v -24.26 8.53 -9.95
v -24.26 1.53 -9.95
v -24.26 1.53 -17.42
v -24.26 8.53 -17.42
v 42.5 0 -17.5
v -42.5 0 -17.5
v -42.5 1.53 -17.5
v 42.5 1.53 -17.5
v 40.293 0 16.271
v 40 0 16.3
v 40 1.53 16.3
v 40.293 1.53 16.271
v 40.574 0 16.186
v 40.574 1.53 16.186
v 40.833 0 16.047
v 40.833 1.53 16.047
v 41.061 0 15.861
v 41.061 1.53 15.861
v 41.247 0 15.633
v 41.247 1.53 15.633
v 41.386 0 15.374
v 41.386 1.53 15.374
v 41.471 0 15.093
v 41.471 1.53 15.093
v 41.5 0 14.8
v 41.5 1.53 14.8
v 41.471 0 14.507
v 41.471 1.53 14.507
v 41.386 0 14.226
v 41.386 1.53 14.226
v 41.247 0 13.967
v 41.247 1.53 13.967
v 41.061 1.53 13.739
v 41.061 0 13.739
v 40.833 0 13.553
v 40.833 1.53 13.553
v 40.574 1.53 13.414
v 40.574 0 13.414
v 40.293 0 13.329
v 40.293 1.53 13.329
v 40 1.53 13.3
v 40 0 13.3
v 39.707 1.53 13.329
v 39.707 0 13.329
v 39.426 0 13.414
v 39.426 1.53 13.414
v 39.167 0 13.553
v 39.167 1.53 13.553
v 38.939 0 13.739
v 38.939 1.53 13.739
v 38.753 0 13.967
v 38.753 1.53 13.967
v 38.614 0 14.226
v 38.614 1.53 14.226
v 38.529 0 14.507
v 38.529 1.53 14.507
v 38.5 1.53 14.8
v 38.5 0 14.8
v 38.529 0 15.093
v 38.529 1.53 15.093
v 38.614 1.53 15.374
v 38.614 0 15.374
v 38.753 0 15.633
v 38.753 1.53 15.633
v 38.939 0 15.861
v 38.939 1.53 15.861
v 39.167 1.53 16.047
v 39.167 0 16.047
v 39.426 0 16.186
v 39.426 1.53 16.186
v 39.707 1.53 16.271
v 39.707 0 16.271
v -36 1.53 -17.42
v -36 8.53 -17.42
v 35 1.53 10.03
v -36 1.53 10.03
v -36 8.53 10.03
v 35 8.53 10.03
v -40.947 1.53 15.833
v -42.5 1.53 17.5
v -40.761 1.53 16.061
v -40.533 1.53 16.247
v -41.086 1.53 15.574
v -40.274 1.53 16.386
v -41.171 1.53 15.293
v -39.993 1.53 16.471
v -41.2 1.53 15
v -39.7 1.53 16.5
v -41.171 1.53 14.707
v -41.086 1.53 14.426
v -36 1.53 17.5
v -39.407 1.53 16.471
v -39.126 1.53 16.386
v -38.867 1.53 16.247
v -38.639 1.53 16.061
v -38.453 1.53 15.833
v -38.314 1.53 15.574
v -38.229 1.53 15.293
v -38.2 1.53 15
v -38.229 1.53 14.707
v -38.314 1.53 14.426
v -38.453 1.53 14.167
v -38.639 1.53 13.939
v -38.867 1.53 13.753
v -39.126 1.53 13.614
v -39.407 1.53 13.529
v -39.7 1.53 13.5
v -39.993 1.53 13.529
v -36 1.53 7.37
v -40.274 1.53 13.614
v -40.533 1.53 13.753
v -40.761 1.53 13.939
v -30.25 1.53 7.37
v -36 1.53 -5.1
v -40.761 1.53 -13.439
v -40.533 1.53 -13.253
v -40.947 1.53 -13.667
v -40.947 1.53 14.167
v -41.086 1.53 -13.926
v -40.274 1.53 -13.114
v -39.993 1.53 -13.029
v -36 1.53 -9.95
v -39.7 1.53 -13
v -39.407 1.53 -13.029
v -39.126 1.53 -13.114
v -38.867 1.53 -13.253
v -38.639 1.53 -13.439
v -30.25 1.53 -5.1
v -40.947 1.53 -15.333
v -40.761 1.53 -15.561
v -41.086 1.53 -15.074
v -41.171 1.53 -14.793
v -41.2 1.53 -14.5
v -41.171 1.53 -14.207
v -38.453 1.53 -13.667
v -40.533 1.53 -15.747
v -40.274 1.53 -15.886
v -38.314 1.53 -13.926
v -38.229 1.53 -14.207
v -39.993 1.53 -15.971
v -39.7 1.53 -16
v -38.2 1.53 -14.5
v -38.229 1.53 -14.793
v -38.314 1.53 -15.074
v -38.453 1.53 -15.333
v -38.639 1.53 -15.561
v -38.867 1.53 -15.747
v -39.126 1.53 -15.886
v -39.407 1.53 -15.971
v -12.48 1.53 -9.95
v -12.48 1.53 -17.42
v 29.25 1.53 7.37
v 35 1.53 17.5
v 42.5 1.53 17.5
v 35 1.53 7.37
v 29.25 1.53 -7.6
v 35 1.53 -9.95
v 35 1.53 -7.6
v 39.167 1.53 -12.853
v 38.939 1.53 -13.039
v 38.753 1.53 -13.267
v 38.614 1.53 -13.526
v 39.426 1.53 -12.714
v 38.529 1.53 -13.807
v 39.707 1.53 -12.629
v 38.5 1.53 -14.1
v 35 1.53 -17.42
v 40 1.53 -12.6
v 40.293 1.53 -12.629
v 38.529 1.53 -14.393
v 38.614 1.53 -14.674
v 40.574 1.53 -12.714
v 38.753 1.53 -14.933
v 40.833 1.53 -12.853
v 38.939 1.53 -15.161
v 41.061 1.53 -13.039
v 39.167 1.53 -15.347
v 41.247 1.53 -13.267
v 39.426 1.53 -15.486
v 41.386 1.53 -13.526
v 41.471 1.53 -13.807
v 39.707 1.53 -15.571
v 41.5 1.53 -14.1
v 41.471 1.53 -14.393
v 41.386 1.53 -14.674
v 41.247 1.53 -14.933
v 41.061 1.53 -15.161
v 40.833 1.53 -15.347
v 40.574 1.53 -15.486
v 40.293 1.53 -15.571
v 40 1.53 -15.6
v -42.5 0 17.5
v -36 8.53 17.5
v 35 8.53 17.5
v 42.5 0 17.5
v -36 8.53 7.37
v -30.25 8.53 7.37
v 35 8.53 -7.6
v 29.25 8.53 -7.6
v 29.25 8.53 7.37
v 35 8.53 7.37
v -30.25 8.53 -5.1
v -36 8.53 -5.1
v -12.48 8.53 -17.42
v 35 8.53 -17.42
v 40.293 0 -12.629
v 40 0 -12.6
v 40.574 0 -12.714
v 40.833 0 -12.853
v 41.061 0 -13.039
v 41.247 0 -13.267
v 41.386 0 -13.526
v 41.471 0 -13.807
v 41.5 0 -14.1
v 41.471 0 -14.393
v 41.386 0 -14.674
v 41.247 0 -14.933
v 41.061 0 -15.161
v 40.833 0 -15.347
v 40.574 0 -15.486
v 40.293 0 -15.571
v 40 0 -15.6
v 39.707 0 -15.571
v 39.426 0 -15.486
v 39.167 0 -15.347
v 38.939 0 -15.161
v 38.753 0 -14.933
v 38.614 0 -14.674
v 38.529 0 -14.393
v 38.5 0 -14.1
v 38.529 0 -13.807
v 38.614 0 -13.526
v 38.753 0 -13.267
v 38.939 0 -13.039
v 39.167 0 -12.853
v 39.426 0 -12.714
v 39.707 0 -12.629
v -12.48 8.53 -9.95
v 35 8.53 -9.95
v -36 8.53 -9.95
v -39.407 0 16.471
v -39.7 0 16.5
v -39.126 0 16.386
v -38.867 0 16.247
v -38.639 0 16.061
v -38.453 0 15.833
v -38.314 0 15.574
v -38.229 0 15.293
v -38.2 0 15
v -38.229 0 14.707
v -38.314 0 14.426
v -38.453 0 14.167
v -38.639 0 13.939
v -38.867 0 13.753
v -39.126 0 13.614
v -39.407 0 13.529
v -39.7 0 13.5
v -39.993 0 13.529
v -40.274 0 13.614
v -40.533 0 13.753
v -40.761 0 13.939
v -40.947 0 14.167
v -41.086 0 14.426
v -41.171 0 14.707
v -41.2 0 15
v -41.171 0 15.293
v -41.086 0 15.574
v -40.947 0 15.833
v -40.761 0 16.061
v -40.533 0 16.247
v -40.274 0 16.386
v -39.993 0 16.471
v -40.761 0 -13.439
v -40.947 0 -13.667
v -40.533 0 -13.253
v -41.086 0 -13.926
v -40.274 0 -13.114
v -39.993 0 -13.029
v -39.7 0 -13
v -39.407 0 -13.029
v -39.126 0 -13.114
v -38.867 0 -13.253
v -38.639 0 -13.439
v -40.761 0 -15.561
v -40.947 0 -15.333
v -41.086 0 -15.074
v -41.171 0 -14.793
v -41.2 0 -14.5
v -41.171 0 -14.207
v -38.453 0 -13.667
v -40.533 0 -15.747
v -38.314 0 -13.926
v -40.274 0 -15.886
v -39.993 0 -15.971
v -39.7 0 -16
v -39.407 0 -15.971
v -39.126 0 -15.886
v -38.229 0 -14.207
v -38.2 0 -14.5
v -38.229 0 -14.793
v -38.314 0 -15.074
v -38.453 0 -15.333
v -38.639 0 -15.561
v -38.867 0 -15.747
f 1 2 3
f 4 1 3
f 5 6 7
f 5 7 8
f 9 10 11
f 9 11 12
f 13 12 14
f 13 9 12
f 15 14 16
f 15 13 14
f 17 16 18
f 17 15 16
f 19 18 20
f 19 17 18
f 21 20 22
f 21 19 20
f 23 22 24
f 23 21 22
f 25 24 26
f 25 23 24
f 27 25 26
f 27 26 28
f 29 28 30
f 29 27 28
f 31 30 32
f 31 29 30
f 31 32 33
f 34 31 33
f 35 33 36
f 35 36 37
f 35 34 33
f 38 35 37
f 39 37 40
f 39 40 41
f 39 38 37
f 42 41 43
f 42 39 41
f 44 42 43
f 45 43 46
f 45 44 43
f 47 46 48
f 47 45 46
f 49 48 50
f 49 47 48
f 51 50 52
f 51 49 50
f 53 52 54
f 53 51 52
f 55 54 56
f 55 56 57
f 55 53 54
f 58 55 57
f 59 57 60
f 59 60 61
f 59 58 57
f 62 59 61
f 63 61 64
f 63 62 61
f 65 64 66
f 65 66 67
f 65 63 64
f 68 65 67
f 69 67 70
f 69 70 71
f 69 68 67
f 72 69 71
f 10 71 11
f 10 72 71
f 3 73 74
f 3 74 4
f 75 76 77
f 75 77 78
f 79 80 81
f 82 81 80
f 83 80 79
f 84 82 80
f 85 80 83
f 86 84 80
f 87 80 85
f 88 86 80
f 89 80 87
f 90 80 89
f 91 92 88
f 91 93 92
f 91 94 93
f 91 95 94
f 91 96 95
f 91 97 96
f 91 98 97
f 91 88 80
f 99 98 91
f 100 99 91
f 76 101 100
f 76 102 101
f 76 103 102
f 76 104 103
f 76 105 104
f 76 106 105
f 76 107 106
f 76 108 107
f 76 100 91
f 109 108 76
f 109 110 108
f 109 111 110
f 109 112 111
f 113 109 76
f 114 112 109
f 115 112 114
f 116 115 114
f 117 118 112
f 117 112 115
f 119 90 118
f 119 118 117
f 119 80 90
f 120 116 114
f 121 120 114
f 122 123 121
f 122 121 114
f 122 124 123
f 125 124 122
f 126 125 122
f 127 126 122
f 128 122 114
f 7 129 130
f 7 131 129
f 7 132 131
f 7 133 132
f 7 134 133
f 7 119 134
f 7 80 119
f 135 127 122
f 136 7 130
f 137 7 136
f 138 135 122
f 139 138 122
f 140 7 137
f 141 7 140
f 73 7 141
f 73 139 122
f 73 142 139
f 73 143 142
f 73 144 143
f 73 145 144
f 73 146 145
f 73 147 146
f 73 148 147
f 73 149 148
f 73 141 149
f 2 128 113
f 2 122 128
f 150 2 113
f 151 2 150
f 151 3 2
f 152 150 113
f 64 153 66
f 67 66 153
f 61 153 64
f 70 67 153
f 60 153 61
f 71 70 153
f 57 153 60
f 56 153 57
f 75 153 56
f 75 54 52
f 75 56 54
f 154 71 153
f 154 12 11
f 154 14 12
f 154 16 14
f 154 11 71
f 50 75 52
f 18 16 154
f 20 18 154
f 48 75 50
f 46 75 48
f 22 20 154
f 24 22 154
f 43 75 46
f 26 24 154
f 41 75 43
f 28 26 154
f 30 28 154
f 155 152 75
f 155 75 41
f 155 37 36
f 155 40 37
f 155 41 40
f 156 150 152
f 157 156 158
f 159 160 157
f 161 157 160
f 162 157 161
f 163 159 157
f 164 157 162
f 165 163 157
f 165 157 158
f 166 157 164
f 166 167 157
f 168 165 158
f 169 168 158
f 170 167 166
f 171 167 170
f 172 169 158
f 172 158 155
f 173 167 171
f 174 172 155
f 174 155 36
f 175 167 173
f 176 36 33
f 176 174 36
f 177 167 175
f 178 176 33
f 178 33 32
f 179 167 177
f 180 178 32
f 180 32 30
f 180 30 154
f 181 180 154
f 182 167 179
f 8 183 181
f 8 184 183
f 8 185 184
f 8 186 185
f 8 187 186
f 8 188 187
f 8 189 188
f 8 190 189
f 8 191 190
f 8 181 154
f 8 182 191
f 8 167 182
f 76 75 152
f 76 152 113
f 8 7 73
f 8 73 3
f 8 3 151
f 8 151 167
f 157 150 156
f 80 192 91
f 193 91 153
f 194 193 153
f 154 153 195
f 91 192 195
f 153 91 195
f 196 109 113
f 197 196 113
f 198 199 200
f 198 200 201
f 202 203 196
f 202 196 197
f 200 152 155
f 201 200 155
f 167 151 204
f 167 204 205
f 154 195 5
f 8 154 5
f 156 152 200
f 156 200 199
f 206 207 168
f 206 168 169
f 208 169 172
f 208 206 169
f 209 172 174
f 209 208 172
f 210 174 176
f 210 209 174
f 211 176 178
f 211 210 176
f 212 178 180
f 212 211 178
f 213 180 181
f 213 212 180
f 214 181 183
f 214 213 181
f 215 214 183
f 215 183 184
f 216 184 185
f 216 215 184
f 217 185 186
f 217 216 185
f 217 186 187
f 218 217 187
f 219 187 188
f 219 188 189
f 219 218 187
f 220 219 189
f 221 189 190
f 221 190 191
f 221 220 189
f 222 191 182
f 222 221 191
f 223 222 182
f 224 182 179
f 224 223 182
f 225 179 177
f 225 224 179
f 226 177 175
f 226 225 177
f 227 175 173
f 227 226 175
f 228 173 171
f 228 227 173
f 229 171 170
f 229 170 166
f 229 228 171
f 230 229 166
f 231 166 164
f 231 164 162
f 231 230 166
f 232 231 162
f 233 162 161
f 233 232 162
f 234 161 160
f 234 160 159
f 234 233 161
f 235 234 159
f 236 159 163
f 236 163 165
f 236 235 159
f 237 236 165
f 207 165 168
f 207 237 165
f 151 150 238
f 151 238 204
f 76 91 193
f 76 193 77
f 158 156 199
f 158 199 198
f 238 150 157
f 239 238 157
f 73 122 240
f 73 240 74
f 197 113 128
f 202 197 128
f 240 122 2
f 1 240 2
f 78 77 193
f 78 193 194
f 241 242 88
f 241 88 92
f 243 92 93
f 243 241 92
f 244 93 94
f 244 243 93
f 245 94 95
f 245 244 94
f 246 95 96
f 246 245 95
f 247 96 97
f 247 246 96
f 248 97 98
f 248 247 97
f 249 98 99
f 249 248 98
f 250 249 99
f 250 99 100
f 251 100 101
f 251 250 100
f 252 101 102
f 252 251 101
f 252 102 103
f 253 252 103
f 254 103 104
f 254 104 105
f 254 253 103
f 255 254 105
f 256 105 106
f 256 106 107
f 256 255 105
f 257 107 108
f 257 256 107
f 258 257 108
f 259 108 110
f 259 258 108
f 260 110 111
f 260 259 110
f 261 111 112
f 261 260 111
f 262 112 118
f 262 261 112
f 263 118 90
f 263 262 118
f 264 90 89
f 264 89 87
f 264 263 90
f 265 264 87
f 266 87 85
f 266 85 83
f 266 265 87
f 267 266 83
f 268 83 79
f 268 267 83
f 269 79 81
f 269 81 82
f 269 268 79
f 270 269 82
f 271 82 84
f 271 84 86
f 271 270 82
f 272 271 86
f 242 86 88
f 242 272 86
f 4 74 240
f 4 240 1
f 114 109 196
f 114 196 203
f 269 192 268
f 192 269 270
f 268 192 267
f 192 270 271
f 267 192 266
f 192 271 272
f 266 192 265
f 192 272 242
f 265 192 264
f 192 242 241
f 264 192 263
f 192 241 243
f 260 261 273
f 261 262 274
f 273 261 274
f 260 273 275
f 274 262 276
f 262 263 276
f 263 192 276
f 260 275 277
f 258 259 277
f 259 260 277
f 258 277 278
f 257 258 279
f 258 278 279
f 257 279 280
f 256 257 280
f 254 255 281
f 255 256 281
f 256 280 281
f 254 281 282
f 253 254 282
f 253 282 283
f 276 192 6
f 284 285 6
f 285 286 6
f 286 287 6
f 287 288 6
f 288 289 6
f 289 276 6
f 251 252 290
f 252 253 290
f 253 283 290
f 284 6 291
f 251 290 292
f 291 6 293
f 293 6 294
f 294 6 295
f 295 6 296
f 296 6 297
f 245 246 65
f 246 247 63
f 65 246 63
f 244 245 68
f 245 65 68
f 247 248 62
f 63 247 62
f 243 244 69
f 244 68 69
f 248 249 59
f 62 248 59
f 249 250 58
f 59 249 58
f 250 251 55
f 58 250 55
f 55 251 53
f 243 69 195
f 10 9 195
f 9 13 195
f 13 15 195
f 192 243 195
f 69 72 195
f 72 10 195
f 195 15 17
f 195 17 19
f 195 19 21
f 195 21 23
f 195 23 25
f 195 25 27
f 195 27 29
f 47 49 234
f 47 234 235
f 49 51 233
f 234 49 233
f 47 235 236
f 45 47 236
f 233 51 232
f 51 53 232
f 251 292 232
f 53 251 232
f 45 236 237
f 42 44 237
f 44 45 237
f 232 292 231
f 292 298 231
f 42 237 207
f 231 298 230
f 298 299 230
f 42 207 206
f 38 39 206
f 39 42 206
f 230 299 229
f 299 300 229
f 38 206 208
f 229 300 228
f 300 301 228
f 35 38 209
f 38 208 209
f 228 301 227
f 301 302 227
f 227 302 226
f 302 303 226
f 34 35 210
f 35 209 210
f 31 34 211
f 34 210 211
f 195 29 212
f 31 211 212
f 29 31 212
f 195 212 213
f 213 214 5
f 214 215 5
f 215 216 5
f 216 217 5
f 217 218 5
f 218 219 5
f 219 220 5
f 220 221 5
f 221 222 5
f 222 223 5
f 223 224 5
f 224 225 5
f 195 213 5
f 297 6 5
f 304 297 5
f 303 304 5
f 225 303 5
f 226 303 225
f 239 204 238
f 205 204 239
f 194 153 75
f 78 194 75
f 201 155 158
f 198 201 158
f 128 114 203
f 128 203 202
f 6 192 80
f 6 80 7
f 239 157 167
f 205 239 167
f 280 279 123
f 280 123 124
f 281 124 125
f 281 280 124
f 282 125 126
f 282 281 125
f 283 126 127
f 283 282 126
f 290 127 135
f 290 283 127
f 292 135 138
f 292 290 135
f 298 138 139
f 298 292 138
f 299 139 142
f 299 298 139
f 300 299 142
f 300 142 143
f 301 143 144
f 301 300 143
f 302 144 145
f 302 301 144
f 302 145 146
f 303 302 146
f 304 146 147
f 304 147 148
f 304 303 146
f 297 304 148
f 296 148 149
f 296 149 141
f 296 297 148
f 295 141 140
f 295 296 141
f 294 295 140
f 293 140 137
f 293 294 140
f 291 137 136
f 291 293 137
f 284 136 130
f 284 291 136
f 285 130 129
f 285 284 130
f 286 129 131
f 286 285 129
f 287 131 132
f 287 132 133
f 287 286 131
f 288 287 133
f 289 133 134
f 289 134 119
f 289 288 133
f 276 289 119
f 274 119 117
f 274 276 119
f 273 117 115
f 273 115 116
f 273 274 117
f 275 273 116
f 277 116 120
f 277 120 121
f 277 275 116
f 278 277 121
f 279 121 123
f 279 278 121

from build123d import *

# Parameters (mm, degrees)
SKETCH1_W           = 85
SKETCH1_H           = 35
SKETCH1_R           = 1.5
BOSS_EXTRUDE2_DEPTH = 1.53
SKETCH2_W           = 71
SKETCH2_H           = 7.47
SKETCH2_W_2         = 5.75
SKETCH2_H_2         = 14.97
SKETCH2_W_3         = 11.74
SKETCH2_W_4         = 47.48
SKETCH2_H_3         = 12.47
BOSS_EXTRUDE3_DEPTH = 7


with BuildPart() as part:
    # Sketch1 → Boss-Extrude2 (new body)
    with BuildSketch(Plane(origin=(0, 0, 0), x_dir=(1, 0, 0), z_dir=(0, 1, 0))):
        Rectangle(SKETCH1_W, SKETCH1_H)
        with Locations(Location((-39.7, 14.5, 0), (0, 0, 270))):
            Circle(SKETCH1_R, mode=Mode.SUBTRACT)
        with Locations(Location((-39.7, -15, 0), (0, 0, 270))):
            Circle(SKETCH1_R, mode=Mode.SUBTRACT)
        with Locations(Location((40, 14.1, 0), (0, 0, 270))):
            Circle(SKETCH1_R, mode=Mode.SUBTRACT)
        with Locations(Location((40, -14.8, 0), (0, 0, 270))):
            Circle(SKETCH1_R, mode=Mode.SUBTRACT)
    extrude(amount=BOSS_EXTRUDE2_DEPTH)

    # Sketch2 → Boss-Extrude3 (add)
    with BuildSketch(Plane(origin=(0, 1.53, 0), x_dir=(1, 0, 0), z_dir=(0, 1, 0))):
        with Locations((-0.5, -13.765)):
            Rectangle(SKETCH2_W, SKETCH2_H)
        with Locations((32.125, 0.115)):
            Rectangle(SKETCH2_W_2, SKETCH2_H_2)
        with Locations((-30.13, 13.685)):
            Rectangle(SKETCH2_W_3, SKETCH2_H)
        with Locations((11.26, 13.685)):
            Rectangle(SKETCH2_W_4, SKETCH2_H)
        with Locations((-33.125, -1.135)):
            Rectangle(SKETCH2_W_2, SKETCH2_H_3)
    extrude(amount=BOSS_EXTRUDE3_DEPTH)


solid = part.part
